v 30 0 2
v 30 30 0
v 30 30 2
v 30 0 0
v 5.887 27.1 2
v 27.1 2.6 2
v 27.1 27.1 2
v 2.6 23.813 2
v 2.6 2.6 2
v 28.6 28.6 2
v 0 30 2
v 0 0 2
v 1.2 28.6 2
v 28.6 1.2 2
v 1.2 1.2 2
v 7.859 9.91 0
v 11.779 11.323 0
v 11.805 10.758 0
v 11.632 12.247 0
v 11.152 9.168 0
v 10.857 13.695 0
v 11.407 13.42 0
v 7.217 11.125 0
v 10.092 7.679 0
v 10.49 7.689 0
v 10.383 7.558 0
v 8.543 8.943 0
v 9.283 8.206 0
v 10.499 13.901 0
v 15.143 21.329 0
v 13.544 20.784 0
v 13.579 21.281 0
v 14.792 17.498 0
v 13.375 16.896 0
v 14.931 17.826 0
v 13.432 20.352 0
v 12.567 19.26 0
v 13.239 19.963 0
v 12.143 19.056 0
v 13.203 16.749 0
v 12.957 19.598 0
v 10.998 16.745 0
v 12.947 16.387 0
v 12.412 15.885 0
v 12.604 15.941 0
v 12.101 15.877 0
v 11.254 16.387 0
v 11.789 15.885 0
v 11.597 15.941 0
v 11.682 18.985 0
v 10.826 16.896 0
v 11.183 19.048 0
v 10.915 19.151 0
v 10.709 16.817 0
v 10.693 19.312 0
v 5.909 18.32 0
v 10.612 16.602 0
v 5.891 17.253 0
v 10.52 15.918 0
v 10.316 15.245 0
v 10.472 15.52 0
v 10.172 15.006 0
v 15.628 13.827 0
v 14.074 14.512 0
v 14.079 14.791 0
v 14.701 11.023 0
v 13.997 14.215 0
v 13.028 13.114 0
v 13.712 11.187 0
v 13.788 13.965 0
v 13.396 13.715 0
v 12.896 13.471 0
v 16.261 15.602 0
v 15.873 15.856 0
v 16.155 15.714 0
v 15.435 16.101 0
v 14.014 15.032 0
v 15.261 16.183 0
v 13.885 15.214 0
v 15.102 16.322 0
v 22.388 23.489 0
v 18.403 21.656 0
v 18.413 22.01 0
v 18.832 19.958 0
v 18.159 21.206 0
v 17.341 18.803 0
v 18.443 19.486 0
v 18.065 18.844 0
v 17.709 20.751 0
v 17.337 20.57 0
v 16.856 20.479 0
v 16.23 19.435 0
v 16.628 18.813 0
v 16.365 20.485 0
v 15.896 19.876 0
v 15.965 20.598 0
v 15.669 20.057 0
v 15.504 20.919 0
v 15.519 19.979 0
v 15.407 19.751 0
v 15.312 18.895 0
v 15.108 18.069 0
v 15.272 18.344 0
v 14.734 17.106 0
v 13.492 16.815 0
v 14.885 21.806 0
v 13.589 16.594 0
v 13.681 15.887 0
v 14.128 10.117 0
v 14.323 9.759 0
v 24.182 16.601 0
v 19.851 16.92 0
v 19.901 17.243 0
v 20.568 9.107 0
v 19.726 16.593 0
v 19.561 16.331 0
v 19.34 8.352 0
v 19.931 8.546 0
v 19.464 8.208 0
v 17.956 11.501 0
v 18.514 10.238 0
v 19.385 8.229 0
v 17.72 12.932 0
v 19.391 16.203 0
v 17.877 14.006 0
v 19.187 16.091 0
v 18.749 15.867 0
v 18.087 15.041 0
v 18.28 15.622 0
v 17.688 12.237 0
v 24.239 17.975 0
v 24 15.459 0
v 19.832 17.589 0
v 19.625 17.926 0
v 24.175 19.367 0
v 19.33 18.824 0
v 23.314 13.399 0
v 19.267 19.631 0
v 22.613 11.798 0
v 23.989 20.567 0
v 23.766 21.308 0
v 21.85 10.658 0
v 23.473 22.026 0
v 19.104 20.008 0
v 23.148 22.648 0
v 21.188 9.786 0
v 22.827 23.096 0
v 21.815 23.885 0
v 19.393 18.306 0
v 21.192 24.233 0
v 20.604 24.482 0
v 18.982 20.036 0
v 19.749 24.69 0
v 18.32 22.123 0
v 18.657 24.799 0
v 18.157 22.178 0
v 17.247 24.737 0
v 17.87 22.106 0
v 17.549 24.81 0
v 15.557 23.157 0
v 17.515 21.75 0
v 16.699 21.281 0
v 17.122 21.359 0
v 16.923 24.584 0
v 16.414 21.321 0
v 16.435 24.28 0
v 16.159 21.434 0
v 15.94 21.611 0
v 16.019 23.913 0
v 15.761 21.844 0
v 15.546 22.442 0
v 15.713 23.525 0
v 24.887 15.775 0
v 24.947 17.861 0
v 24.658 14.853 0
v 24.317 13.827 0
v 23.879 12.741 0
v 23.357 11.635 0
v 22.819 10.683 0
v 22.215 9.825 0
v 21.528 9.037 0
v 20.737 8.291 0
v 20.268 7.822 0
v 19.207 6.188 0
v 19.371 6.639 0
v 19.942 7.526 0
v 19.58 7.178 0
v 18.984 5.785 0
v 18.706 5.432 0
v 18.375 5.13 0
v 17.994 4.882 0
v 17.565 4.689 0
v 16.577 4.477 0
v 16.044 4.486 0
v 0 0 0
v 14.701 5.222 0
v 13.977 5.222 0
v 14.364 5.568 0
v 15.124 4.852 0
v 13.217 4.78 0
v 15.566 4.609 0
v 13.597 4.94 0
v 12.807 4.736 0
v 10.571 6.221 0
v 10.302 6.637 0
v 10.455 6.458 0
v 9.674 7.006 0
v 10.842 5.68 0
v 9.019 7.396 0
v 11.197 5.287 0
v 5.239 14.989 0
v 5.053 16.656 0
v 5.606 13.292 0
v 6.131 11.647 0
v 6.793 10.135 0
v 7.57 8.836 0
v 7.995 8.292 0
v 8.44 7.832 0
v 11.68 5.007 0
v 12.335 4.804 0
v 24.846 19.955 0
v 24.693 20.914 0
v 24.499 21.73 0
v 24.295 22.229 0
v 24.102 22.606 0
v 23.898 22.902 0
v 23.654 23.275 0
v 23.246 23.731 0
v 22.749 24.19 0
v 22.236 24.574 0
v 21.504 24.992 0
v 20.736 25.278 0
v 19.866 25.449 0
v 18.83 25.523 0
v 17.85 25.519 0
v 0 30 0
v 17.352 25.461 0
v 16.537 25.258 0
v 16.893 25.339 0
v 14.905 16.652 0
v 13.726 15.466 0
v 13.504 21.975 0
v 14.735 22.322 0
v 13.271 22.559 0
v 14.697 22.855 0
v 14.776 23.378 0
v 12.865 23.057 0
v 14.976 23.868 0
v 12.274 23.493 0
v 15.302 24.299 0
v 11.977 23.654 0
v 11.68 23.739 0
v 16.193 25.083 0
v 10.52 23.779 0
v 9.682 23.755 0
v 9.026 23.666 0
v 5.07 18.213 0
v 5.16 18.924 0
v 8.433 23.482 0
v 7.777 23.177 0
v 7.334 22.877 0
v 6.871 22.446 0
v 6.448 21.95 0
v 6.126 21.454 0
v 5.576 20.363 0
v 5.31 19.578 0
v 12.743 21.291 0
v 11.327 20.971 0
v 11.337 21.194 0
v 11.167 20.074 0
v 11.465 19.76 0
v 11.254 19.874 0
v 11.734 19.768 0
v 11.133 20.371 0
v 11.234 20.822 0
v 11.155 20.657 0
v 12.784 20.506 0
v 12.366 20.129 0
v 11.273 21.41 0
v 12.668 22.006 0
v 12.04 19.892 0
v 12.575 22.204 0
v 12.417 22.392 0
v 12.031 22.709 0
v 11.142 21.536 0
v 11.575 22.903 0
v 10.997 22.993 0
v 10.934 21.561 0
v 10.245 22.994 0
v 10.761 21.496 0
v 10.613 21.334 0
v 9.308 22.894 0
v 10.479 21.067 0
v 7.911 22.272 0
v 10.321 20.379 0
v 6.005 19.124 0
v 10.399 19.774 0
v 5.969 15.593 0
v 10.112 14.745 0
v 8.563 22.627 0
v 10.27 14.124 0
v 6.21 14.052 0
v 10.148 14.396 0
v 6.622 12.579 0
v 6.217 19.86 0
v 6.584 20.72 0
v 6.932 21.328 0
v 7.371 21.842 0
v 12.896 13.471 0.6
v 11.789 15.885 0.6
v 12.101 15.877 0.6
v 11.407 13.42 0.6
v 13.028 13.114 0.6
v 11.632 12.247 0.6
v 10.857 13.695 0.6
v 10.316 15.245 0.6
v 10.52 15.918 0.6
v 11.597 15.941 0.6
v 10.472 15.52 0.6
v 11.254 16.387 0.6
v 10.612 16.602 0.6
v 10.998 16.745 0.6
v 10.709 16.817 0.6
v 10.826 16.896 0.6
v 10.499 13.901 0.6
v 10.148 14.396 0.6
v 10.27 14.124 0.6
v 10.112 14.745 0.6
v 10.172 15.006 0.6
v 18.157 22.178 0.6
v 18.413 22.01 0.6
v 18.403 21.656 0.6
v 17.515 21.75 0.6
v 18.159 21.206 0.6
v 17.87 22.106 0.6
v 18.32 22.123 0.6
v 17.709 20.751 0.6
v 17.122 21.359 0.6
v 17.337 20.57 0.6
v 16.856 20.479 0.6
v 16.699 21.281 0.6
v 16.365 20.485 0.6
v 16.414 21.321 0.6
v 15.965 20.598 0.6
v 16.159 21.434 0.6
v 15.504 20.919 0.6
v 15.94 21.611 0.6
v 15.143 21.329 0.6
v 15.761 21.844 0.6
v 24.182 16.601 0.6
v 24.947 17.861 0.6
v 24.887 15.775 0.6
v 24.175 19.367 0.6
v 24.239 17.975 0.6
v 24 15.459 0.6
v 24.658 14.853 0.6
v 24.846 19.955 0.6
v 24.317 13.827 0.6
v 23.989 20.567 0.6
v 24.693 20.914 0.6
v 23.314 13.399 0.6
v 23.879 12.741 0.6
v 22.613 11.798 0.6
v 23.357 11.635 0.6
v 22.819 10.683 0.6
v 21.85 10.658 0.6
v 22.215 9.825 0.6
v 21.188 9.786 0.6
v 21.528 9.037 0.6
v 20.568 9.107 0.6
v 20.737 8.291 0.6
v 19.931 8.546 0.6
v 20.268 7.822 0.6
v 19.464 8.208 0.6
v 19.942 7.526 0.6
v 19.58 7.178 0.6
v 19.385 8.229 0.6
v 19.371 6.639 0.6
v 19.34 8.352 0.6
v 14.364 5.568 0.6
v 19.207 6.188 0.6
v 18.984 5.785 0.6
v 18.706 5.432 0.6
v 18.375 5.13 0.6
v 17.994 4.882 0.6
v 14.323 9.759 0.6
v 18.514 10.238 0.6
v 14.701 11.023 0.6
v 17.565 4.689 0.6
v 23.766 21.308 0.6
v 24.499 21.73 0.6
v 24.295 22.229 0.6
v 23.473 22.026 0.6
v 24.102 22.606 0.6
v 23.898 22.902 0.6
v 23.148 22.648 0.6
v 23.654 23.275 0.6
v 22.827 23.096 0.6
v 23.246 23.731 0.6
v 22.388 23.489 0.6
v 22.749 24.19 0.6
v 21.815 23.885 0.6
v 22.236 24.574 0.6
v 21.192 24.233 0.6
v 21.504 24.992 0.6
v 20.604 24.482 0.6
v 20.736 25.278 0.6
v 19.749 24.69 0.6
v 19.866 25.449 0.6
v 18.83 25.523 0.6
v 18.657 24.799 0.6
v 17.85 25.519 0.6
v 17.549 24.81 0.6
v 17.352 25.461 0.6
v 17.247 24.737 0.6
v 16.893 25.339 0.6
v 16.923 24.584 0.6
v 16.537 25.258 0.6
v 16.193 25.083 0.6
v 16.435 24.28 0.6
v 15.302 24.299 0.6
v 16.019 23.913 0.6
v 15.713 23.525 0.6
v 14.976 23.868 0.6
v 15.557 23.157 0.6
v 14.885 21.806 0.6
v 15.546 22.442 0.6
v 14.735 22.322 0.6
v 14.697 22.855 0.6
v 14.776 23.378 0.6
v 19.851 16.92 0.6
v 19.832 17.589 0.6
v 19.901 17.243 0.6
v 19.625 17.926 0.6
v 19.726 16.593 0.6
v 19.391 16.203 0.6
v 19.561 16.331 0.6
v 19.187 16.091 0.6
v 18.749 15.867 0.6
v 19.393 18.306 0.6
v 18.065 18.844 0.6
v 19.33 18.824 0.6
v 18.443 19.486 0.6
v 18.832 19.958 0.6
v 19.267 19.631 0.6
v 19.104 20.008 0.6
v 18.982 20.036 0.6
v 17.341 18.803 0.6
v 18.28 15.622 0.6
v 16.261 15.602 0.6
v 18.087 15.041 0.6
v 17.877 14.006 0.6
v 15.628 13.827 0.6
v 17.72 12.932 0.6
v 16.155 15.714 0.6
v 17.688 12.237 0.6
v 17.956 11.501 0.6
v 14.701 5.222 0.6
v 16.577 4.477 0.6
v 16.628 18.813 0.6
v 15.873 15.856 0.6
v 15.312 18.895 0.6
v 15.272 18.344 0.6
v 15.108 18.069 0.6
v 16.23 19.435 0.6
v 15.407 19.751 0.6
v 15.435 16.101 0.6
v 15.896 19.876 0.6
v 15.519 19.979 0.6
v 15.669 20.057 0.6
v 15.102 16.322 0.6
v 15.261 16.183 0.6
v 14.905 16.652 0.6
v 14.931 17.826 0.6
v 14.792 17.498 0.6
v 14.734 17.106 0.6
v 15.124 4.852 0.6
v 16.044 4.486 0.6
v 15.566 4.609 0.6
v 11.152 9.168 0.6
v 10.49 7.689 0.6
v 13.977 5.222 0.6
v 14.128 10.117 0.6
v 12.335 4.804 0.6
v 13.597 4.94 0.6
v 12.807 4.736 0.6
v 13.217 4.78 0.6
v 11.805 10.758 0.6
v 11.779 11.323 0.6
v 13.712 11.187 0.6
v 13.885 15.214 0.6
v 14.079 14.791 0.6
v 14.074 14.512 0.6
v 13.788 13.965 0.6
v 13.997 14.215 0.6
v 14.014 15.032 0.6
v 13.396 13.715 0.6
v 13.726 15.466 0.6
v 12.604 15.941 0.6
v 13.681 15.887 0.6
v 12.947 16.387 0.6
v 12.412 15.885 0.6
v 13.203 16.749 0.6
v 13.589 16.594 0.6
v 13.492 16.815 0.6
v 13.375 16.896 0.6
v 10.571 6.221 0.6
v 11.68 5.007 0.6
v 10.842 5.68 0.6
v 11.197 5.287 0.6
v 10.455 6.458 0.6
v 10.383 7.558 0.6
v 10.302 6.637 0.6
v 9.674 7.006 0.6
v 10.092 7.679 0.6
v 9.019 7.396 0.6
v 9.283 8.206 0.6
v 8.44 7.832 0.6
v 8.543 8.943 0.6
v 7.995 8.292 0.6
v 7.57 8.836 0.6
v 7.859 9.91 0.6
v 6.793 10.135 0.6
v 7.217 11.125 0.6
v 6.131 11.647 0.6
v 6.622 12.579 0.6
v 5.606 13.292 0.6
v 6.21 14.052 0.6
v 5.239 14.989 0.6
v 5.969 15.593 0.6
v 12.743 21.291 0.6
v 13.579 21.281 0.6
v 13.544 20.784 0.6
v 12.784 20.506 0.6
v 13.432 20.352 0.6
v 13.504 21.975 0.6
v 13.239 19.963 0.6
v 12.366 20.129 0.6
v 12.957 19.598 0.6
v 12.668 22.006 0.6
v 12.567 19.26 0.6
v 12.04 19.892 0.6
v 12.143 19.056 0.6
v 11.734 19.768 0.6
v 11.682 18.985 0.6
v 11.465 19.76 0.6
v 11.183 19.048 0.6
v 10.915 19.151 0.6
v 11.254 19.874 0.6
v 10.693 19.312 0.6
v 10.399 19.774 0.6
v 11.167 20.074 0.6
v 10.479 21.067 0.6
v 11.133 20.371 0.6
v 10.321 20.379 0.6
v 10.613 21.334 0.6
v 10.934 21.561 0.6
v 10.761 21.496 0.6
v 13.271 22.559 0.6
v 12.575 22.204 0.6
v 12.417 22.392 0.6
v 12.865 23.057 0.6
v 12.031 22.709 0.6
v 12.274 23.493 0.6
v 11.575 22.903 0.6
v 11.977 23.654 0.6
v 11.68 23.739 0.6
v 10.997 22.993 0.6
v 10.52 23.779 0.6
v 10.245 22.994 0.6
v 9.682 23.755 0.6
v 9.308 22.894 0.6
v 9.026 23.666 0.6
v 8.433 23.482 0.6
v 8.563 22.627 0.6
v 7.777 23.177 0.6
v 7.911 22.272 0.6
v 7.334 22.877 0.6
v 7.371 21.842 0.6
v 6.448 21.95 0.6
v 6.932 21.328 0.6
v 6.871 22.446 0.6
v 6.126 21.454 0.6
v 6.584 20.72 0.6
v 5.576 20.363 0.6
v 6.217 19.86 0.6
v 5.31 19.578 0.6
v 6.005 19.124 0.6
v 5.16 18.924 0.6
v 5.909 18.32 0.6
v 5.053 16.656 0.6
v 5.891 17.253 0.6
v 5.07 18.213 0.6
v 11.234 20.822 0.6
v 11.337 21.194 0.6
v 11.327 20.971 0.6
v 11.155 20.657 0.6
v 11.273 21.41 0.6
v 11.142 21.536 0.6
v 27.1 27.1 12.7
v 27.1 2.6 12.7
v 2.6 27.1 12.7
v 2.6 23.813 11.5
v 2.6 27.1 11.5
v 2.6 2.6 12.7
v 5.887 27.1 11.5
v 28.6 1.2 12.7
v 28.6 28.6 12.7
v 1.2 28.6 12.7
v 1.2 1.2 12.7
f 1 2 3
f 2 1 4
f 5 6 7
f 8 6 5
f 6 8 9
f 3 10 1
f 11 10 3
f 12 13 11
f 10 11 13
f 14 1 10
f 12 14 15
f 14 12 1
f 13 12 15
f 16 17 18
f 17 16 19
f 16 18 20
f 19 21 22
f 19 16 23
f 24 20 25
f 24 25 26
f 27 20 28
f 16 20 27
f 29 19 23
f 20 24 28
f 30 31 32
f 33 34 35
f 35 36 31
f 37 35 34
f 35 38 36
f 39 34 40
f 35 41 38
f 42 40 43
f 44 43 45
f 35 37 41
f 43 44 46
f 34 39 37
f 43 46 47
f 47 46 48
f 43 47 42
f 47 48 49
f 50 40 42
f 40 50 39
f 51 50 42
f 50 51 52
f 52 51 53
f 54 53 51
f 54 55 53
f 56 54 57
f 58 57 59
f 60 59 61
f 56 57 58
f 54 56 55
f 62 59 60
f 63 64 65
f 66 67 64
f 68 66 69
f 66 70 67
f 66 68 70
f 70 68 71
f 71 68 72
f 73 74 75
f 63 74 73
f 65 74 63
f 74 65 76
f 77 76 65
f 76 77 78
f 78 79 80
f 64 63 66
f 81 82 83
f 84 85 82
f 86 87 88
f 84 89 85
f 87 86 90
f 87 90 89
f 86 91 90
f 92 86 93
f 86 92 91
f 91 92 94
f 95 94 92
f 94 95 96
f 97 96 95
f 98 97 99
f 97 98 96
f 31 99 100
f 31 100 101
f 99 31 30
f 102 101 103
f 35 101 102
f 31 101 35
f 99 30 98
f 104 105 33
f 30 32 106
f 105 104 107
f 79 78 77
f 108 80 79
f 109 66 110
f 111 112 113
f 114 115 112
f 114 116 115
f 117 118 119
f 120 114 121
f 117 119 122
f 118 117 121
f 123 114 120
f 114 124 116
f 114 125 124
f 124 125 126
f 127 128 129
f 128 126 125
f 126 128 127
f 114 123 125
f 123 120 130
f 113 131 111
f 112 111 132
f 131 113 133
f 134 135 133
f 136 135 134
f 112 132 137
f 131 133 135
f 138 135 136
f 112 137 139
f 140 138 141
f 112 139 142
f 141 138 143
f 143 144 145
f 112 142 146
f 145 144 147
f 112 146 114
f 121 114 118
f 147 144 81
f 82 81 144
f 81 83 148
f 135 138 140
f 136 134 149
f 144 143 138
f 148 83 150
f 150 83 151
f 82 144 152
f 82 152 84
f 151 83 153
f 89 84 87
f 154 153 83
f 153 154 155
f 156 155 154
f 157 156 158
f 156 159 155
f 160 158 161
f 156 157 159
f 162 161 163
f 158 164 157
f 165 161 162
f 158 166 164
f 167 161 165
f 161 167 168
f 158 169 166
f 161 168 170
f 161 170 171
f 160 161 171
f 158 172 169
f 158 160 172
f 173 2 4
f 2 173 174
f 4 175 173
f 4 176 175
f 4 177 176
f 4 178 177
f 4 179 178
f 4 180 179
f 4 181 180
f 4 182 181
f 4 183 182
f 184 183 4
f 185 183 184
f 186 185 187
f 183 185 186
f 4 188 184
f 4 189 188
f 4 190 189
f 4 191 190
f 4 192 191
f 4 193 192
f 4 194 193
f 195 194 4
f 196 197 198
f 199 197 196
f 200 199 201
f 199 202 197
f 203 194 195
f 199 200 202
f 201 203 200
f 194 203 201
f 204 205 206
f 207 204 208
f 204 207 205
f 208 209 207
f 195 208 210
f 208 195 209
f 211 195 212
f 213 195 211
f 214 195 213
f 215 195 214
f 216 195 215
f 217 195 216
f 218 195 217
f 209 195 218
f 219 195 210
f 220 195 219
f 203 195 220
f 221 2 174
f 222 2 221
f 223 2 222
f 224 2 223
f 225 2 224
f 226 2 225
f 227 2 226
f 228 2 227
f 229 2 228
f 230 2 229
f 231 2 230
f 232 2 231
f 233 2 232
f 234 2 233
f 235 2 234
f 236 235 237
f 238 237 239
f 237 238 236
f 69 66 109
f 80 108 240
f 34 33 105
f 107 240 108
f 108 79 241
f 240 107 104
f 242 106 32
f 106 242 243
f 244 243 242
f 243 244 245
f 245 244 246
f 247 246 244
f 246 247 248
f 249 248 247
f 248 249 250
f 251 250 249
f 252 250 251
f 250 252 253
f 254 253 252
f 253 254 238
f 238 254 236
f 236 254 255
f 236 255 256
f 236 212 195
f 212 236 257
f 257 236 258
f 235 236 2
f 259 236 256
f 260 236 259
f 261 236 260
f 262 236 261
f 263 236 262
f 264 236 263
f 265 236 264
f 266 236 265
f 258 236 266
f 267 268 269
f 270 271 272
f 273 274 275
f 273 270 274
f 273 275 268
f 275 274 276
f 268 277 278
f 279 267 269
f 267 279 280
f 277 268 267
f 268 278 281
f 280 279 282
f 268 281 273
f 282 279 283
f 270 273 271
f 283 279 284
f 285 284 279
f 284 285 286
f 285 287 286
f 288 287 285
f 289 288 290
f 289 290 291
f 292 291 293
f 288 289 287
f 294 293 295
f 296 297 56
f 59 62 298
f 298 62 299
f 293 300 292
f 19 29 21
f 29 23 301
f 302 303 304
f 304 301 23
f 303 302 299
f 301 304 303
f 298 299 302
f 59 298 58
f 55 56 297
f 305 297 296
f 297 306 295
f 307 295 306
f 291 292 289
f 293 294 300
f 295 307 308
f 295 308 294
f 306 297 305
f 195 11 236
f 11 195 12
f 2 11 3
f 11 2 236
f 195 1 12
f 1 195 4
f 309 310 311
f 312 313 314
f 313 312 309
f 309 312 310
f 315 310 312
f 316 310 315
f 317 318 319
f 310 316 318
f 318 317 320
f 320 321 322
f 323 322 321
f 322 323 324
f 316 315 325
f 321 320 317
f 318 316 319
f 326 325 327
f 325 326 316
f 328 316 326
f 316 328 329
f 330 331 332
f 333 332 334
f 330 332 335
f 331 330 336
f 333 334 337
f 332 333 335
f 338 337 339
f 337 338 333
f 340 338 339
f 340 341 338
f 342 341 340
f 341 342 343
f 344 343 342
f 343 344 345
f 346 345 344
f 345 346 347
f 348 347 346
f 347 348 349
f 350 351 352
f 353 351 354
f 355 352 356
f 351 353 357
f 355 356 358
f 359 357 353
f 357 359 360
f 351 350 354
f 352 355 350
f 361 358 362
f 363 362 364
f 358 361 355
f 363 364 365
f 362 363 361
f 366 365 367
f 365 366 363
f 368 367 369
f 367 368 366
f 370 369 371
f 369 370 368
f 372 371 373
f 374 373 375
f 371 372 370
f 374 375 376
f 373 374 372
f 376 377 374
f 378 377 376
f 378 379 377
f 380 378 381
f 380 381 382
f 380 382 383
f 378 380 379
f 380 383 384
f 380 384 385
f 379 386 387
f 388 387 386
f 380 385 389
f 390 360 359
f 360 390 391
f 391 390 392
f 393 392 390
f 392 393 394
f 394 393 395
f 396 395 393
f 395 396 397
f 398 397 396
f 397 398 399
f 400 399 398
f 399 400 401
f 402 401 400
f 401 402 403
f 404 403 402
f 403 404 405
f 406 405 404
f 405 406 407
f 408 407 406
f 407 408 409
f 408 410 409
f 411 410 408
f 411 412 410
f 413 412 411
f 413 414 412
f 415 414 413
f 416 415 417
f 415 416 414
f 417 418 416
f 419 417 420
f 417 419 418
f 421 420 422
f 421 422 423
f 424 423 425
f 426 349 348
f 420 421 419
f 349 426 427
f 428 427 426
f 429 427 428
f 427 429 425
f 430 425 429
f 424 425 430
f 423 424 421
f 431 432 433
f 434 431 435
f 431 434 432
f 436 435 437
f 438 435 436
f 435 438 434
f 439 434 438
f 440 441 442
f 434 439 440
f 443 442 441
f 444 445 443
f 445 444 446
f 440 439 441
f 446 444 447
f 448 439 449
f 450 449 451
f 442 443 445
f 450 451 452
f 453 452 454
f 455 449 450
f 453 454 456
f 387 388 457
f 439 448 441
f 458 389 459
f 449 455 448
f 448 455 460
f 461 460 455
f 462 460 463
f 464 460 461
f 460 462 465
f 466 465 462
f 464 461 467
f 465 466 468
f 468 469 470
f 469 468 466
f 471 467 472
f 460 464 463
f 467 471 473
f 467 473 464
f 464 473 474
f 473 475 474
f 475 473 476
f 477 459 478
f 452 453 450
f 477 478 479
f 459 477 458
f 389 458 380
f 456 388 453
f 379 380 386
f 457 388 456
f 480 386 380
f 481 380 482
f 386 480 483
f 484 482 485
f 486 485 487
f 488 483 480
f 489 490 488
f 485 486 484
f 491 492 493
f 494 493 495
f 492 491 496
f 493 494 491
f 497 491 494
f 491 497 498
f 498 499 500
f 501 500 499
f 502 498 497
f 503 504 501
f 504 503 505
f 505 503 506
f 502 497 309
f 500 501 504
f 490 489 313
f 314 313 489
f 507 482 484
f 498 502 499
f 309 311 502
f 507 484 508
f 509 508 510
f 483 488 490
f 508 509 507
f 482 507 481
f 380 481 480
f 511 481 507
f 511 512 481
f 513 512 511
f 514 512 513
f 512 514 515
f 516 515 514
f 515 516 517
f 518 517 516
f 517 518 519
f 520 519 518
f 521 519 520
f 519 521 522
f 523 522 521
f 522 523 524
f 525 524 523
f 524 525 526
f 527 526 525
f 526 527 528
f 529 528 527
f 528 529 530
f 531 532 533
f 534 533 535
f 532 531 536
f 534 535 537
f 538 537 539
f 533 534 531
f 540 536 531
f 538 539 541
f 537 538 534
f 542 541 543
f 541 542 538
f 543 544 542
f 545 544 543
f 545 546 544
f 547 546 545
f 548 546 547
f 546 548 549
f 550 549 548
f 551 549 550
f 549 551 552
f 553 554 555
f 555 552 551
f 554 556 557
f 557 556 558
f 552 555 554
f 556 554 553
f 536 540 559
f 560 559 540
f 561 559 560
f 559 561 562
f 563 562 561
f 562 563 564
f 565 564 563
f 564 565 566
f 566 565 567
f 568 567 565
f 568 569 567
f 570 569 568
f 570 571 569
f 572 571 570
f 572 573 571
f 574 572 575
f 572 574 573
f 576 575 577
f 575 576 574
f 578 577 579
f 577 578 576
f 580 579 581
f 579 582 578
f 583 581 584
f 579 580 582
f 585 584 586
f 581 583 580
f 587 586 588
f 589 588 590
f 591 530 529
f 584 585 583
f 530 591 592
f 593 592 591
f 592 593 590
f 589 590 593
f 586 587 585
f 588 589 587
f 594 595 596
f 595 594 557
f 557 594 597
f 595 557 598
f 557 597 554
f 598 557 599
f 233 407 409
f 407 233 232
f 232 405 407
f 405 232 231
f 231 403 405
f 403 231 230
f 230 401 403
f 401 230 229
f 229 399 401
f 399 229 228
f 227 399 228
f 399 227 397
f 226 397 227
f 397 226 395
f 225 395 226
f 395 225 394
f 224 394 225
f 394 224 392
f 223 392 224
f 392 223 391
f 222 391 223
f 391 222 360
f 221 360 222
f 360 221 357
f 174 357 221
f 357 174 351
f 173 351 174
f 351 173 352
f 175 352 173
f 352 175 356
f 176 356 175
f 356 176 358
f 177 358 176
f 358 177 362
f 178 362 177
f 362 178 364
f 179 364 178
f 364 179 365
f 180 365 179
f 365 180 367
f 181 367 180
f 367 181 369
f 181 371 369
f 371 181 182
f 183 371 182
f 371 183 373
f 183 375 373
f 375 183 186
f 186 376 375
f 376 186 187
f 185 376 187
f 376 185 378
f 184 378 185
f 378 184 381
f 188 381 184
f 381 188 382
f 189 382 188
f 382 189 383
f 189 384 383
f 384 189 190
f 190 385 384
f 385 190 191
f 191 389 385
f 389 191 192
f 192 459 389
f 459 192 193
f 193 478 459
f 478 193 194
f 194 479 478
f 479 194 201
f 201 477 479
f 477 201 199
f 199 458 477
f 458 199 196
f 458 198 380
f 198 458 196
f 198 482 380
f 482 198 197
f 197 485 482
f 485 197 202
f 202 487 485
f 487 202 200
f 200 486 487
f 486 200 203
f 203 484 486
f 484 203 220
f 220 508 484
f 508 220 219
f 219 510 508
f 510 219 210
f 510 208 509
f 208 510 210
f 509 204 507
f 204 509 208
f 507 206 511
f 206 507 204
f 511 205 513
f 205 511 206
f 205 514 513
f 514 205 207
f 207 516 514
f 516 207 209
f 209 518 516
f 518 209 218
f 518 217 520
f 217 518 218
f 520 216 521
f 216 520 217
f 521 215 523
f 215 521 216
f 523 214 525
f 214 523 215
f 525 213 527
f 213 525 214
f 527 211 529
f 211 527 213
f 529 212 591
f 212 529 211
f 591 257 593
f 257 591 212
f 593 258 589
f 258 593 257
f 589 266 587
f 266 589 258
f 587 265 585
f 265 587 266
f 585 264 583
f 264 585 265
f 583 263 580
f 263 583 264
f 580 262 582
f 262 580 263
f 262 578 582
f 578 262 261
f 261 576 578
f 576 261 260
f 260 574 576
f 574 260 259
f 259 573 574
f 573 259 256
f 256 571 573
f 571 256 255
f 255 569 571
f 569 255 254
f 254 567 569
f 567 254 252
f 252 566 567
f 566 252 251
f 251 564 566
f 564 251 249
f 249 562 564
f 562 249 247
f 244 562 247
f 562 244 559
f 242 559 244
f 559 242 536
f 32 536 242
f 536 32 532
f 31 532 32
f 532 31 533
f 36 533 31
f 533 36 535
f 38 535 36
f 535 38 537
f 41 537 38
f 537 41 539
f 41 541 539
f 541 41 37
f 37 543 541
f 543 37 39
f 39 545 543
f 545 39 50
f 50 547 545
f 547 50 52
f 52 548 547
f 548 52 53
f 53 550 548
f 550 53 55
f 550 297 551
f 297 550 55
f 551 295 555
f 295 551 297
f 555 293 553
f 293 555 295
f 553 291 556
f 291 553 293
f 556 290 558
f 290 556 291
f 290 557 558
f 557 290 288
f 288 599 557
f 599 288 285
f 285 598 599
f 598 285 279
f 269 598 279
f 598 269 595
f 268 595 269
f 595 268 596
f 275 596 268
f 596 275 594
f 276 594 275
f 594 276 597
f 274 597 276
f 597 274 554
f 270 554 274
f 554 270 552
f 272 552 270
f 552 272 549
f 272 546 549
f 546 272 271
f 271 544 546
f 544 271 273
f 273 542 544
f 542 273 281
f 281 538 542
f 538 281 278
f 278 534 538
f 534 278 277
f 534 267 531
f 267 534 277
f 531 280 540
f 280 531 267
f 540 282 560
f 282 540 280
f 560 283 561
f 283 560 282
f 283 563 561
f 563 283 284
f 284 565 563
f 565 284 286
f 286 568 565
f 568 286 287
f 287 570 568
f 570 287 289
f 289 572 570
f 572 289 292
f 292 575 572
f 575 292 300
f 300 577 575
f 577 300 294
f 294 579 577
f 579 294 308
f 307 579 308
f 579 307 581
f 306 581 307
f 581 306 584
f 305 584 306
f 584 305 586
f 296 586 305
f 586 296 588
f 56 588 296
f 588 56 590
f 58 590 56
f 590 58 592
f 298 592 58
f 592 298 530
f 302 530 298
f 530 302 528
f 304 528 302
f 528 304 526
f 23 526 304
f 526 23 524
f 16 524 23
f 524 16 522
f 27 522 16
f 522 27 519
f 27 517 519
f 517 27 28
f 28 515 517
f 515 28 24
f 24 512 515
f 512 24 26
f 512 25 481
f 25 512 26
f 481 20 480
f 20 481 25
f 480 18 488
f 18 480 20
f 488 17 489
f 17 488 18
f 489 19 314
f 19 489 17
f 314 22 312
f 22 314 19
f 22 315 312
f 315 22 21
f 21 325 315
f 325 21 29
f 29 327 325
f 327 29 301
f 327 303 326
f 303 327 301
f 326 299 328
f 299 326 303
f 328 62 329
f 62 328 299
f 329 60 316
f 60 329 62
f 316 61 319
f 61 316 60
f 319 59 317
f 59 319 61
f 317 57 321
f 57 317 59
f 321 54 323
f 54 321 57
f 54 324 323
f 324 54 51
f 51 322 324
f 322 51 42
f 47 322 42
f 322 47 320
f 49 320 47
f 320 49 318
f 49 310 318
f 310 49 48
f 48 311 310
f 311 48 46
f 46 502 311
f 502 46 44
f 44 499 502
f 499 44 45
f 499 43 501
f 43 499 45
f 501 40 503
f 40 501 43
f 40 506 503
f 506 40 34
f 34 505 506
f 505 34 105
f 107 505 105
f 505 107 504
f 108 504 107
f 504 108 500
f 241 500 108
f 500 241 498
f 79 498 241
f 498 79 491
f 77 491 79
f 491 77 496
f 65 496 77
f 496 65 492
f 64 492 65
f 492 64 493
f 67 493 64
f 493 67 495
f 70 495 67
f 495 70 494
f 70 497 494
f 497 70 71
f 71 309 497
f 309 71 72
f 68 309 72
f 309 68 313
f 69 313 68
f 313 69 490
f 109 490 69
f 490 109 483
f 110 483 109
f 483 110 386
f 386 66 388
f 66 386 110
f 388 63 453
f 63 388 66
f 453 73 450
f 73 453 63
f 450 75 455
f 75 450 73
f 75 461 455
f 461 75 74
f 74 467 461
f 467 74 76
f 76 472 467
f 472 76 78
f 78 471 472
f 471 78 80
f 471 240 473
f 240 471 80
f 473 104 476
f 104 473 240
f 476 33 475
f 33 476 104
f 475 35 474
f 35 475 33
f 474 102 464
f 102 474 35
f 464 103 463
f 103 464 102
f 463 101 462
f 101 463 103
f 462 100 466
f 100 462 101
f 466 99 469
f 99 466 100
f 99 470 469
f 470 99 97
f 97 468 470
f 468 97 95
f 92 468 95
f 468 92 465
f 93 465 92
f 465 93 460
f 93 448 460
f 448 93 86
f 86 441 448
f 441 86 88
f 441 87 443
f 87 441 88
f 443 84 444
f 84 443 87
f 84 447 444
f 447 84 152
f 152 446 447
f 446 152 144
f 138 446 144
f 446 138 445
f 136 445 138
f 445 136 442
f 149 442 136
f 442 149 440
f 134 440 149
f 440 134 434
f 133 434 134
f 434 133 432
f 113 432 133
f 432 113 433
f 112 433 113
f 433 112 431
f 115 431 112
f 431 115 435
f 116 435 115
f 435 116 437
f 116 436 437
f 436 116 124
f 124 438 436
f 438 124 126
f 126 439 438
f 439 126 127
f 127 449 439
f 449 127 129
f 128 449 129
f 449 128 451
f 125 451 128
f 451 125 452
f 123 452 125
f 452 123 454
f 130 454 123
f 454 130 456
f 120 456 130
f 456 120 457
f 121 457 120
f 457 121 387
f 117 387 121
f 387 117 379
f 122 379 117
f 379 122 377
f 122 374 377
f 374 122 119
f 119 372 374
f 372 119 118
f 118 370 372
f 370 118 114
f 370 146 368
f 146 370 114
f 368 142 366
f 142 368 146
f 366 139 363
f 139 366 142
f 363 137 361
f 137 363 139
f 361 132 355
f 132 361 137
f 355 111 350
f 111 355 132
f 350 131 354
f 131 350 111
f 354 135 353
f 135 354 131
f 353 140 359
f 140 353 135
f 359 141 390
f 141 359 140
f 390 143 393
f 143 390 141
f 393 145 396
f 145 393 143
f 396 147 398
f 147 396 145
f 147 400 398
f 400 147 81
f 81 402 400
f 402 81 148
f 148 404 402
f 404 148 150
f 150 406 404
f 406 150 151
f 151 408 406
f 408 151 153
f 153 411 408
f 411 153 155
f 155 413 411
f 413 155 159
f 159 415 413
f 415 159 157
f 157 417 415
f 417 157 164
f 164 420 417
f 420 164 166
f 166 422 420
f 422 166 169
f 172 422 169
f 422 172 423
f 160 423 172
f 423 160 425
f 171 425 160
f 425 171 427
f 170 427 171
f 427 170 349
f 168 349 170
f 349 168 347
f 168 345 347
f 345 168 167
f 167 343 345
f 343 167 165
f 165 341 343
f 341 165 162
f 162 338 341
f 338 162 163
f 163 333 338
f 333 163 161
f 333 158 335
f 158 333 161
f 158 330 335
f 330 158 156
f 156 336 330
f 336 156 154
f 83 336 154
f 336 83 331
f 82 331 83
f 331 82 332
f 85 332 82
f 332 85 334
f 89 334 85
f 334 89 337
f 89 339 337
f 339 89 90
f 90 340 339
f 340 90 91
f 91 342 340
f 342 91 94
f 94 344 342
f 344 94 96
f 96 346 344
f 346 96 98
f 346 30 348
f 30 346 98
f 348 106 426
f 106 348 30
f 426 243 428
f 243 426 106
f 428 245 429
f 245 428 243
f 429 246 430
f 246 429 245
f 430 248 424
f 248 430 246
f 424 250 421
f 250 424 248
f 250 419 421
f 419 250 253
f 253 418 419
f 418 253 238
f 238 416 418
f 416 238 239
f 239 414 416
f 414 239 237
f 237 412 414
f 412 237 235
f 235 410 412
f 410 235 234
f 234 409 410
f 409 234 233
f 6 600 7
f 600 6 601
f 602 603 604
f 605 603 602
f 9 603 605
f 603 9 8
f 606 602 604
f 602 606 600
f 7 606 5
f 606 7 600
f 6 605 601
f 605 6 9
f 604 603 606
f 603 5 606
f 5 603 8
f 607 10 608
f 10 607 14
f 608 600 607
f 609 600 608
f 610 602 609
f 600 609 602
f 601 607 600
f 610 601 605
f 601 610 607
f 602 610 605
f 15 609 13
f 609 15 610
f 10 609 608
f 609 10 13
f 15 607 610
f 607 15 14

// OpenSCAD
// file: gato4.scad
// Module names are of the form poly_<inkscape-path-id>().  As a result,
// you can associate a polygon in this OpenSCAD program with the corresponding
// SVG element in the Inkscape document by looking for the XML element with
// the attribute id="inkscape-path-id".

// fudge value is used to ensure that subtracted solids are a tad taller
// in the z dimension than the polygon being subtracted from.  This helps
// keep the resulting .stl file manifold.
fudge = 0.1;

module poly_path8(h)
{
  scale([25.4/90, -25.4/90, 1]) union()
  {
    linear_extrude(height=h)
      polygon([[10.415846,-46.334673],[8.383623,-45.792747],[6.806534,-45.434991],[5.284484,-44.658089],[1.338585,-41.186376],[-0.104169,-39.276140],[-0.990708,-37.107113],[-1.340614,-34.788844],[-1.173467,-32.430884],[-0.508849,-30.142781],[0.633658,-28.034086],[2.234475,-26.214347],[4.274018,-24.793115],[6.045862,-24.295643],[8.219917,-24.268124],[10.351633,-24.672451],[11.996463,-25.470522],[13.989876,-27.487221],[15.073023,-29.478516],[15.114655,-31.046432],[14.703888,-31.547255],[13.983525,-31.792992],[12.713386,-31.471223],[11.138414,-29.896251],[9.399735,-28.163217],[7.525574,-27.818868],[6.263550,-27.994394],[5.134890,-28.494864],[4.162881,-29.281116],[3.370808,-30.313986],[2.419615,-32.962931],[2.467598,-36.128400],[3.159118,-37.757706],[4.511111,-39.475922],[6.354223,-41.100994],[8.519105,-42.450870],[9.953656,-43.126161],[11.290831,-43.450046],[16.196390,-43.399241],[21.034209,-42.919410],[24.822045,-41.999265],[27.427242,-40.893538],[30.184855,-39.351731],[32.722310,-37.598233],[34.667034,-35.857437],[36.087473,-33.872492],[37.529081,-31.121230],[38.826740,-27.938120],[39.815331,-24.657633],[40.635277,-19.344218],[40.921764,-13.175576],[40.666325,-7.091610],[39.860492,-2.032223],[36.823448,7.090198],[33.718664,14.180397],[30.338683,19.232022],[27.407484,23.093951],[24.662572,26.100652],[21.841452,28.586596],[19.769715,30.082538],[19.421838,29.990100],[19.222143,29.444646],[15.564143,21.089953],[13.091606,15.495697],[11.906142,12.238495],[12.048680,9.159114],[12.741612,4.403149],[13.671636,-0.183465],[14.525451,-2.754790],[16.602834,-3.838642],[18.544736,-4.832174],[19.447946,-5.328939],[20.200856,-5.896268],[20.932597,-7.056328],[21.486519,-8.504287],[21.705971,-9.935310],[21.401138,-11.465122],[20.486637,-12.961064],[19.459236,-14.643292],[19.176983,-16.935187],[18.899669,-20.512040],[18.177807,-22.179451],[17.638262,-22.303730],[16.973292,-21.958587],[15.248019,-19.870620],[13.577081,-17.025509],[10.370685,-16.844866],[7.209450,-16.890027],[5.448191,-19.644818],[3.969185,-21.598009],[2.964363,-22.399608],[2.298246,-22.052437],[1.801481,-21.044793],[1.383746,-17.251311],[1.203104,-14.812644],[0.480536,-13.593311],[-0.304128,-12.515104],[-0.919440,-11.064323],[-1.179112,-9.325643],[-0.422674,-7.316001],[0.452311,-5.853930],[1.157943,-5.238618],[1.925672,-4.877334],[3.867573,-3.793482],[5.115132,-3.161235],[5.583672,-2.664470],[2.783721,5.193458],[-1.325884,17.612595],[-2.996823,23.212497],[-3.860517,21.626234],[-5.706453,16.890027],[-8.732206,8.354692],[-9.319293,6.774075],[-7.106428,5.690223],[-5.367749,4.583791],[-4.441959,3.477359],[-4.100432,2.163470],[-4.080675,0.925790],[-4.365750,-0.142538],[-4.938724,-0.948371],[-5.644357,-2.066093],[-5.841934,-3.928964],[-6.248379,-7.061973],[-6.680226,-8.037863],[-7.196749,-8.399853],[-7.958832,-7.745026],[-9.093490,-6.141828],[-10.612012,-4.166056],[-11.462299,-3.919085],[-12.841812,-3.883803],[-14.221324,-3.919085],[-15.071611,-4.166056],[-16.590133,-6.141828],[-17.724791,-7.728091],[-18.486874,-8.399853],[-19.003397,-8.046331],[-19.435245,-7.095844],[-19.841689,-4.064445],[-20.056201,-2.303186],[-20.744899,-1.083852],[-21.382791,-0.028225],[-21.648109,1.129012],[-21.488636,2.675054],[-20.948121,3.878158],[-19.933421,4.869572],[-18.351393,5.780544],[-15.912726,6.999877],[-14.919195,12.193335],[-14.264367,16.286005],[-14.151466,18.786768],[-17.041738,25.831806],[-19.977171,32.380078],[-20.451356,32.961520],[-21.738430,32.425239],[-25.322339,30.091006],[-28.597181,26.825337],[-31.626463,22.543557],[-34.473691,17.160990],[-37.105701,10.722796],[-38.933290,4.199927],[-39.998796,-2.627777],[-40.344556,-9.980471],[-40.264820,-14.703977],[-39.842145,-18.267422],[-38.902948,-21.526035],[-37.273642,-25.335041],[-35.733246,-28.026324],[-33.790638,-30.302696],[-31.399249,-32.206493],[-28.512505,-33.780054],[-25.210143,-34.965517],[-21.061023,-35.405832],[-17.729024,-35.402304],[-15.167577,-35.005033],[-13.148056,-34.142044],[-11.441836,-32.741363],[-10.739731,-31.909421],[-10.329759,-31.030909],[-9.996700,-27.864029],[-9.816058,-24.386670],[-11.667639,-22.715732],[-13.109952,-21.669278],[-14.467590,-21.118179],[-15.655875,-21.083603],[-16.590133,-21.586719],[-16.978937,-22.471583],[-17.126414,-23.788293],[-17.028331,-25.054199],[-16.680454,-25.786646],[-16.267659,-26.445707],[-16.223204,-27.435004],[-16.508985,-28.390431],[-17.086899,-28.947880],[-18.009161,-29.061487],[-18.774772,-28.772884],[-19.430305,-28.052432],[-20.022331,-26.870497],[-20.723024,-23.822164],[-20.377970,-21.146404],[-19.076077,-19.097246],[-18.094101,-18.387027],[-16.906257,-17.928719],[-14.694098,-17.649288],[-12.655524,-17.962589],[-10.777836,-18.868621],[-9.048330,-20.367385],[-7.798654,-21.982579],[-6.942721,-23.703617],[-6.450895,-25.619411],[-6.293539,-27.818868],[-6.625186,-30.893310],[-7.659644,-33.480866],[-9.456185,-35.687379],[-12.074083,-37.618696],[-13.389383,-38.330680],[-14.704682,-38.708194],[-19.841689,-38.883190],[-23.556140,-38.778051],[-26.457702,-38.380780],[-29.088301,-37.568597],[-31.989864,-36.218721],[-33.952228,-34.886486],[-36.003503,-32.978455],[-37.876958,-30.782526],[-39.305865,-28.586596],[-41.738886,-23.754423],[-42.918705,-20.277065],[-43.580654,-17.381743],[-43.982622,-14.229615],[-44.054773,-7.334347],[-43.231476,0.049924],[-41.609050,7.564384],[-39.283814,14.850219],[-36.352086,21.548615],[-32.910185,27.300757],[-31.028020,29.709854],[-29.054431,31.747831],[-26.491573,33.678443],[-23.590011,35.405832],[-20.806995,37.042900],[-20.128882,37.831798],[-19.615887,38.883190],[-18.414194,41.280225],[-16.844161,43.021021],[-14.706799,44.262229],[-11.803120,45.160500],[-9.714447,45.461805],[-7.896737,45.267756],[-6.214508,44.557184],[-4.532280,43.308920],[-2.816181,41.773462],[-1.325884,43.308920],[0.550394,44.948105],[2.507113,46.024195],[4.624717,46.566826],[6.983648,46.605636],[11.362100,45.668556],[13.260516,44.814740],[14.948831,43.715364],[16.414872,42.378895],[17.646465,40.813802],[18.631441,39.028551],[19.357625,37.031610],[20.283415,34.643749],[21.886613,33.102646],[23.331749,31.792992],[25.409132,29.715609],[28.911893,26.410425],[31.957404,22.918954],[34.630342,19.122649],[37.015380,14.902965],[39.324917,10.005873],[41.266113,5.193458],[42.775461,0.652005],[43.789455,-3.432198],[44.054773,-12.673165],[43.608813,-21.948003],[42.931406,-26.193090],[42.073356,-29.805930],[41.170146,-32.018794],[40.312097,-33.689733],[39.408887,-34.999387],[38.328563,-36.651980],[36.524260,-38.668678],[34.321980,-40.702312],[32.047725,-42.405710],[28.808165,-44.255879],[25.403487,-45.521784],[21.550026,-46.279634],[16.964118,-46.605636],[12.623065,-46.588701],[10.415846,-46.334673]]);
  }
}

module gato4(h)
{

poly_path8(h);
}

gato4(3);
// file: pcb_holes.scad
// Module names are of the form poly_<inkscape-path-id>().  As a result,
// you can associate a polygon in this OpenSCAD program with the corresponding
// SVG element in the Inkscape document by looking for the XML element with
// the attribute id="inkscape-path-id".

// fudge value is used to ensure that subtracted solids are a tad taller
// in the z dimension than the polygon being subtracted from.  This helps
// keep the resulting .stl file manifold.
fudge = 0.1;

module poly_path14(h)
{
  scale([25.4/90, -25.4/90, 1]) union()
  {
    linear_extrude(height=h)
      polygon([[23.247500,21.596250],[22.941387,23.114434],[22.106406,24.354531],[20.867598,25.190801],[19.350000,25.497500],[17.833125,25.190801],[16.594688,24.354531],[15.759844,23.114434],[15.453750,21.596250],[15.759844,20.081484],[16.594688,18.842812],[17.833125,18.006797],[19.350000,17.700000],[20.867598,18.006797],[22.106406,18.842812],[22.941387,20.081484],[23.247500,21.596250]]);
  }
}

module poly_path16(h)
{
  scale([25.4/90, -25.4/90, 1]) union()
  {
    linear_extrude(height=h)
      polygon([[-15.448750,-21.601250],[-15.755645,-20.084375],[-16.592344,-18.845937],[-17.832871,-18.011094],[-19.351250,-17.705000],[-20.868125,-18.011094],[-22.106563,-18.845937],[-22.941406,-20.084375],[-23.247500,-21.601250],[-22.941406,-23.118652],[-22.106563,-24.357031],[-20.868125,-25.191582],[-19.351250,-25.497500],[-17.832871,-25.191582],[-16.592344,-24.357031],[-15.755645,-23.118652],[-15.448750,-21.601250]]);
  }
}

module pcb_holes(h)
{

poly_path14(h);
poly_path16(h);
}

pcb_holes(3);
// file: pcb_mascara2.scad
// Module names are of the form poly_<inkscape-path-id>().  As a result,
// you can associate a polygon in this OpenSCAD program with the corresponding
// SVG element in the Inkscape document by looking for the XML element with
// the attribute id="inkscape-path-id".

// fudge value is used to ensure that subtracted solids are a tad taller
// in the z dimension than the polygon being subtracted from.  This helps
// keep the resulting .stl file manifold.
fudge = 0.1;

module poly_rect4600(h)
{
  scale([25.4/90, -25.4/90, 1]) union()
  {
    linear_extrude(height=h)
      polygon([[-36.221907,-36.578865],[36.221907,-36.578865],[36.221907,36.578865],[-36.221907,36.578865]]);
  }
}

module pcb_mascara2(h)
{

poly_rect4600(h);
}

pcb_mascara2(7);
// file: pcb_mascara.scad
// Module names are of the form poly_<inkscape-path-id>().  As a result,
// you can associate a polygon in this OpenSCAD program with the corresponding
// SVG element in the Inkscape document by looking for the XML element with
// the attribute id="inkscape-path-id".

// fudge value is used to ensure that subtracted solids are a tad taller
// in the z dimension than the polygon being subtracted from.  This helps
// keep the resulting .stl file manifold.
fudge = 0.1;

module poly_path20(h)
{
  scale([25.4/90, -25.4/90, 1]) union()
  {
    linear_extrude(height=h)
      polygon([[-42.690625,-42.690625],[42.690625,-42.690625],[42.690625,42.690625],[-42.690625,42.690625],[-42.690625,-42.690625]]);
  }
}

module poly_path24(h)
{
  scale([25.4/90, -25.4/90, 1]) union()
  {
    linear_extrude(height=h)
      polygon([[-42.690625,-42.690625],[42.690625,-42.690625],[42.690625,42.690625],[-42.690625,42.690625],[-42.690625,-42.690625]]);
  }
}

module poly_path16(h)
{
  scale([25.4/90, -25.4/90, 1]) union()
  {
    linear_extrude(height=h)
      polygon([[-42.690625,-42.690625],[42.690625,-42.690625],[42.690625,42.690625],[-42.690625,42.690625],[-42.690625,-42.690625]]);
  }
}

module pcb_mascara(h)
{

poly_path20(h);
poly_path24(h);
poly_path16(h);
}

pcb_mascara(1);
// file: pcb_button.scad
// Module names are of the form poly_<inkscape-path-id>().  As a result,
// you can associate a polygon in this OpenSCAD program with the corresponding
// SVG element in the Inkscape document by looking for the XML element with
// the attribute id="inkscape-path-id".

// fudge value is used to ensure that subtracted solids are a tad taller
// in the z dimension than the polygon being subtracted from.  This helps
// keep the resulting .stl file manifold.
fudge = 0.1;

module poly_path14(h)
{
  scale([25.4/90, -25.4/90, 1]) union()
  {
    linear_extrude(height=h)
      polygon([[-7.812500,-7.798125],[7.812500,-7.798125],[7.812500,7.798125],[-7.812500,7.798125],[-7.812500,-7.798125]]);
  }
}

module pcb_button(h)
{

poly_path14(h);
}

pcb_button(12);
// main file
use <pcb_button.scad>
use <pcb_mascara.scad>
use <pcb_mascara2.scad>
use <pcb_holes.scad>
use <gato4.scad>

/*
 *
 * El cubo mide 30x30x25, pero va roto en dos partes
 *
 */

module llavero_abajo() {

    module base() {
            union() {
                difference() {
                    cube([30,30,2]);
                    translate([15,15,-1]) { scale([0.8,0.8,0.8]) gato4(2.0); }
                }
                // bisel interior
                difference() {
                    translate([1.2,1.2,2]) cube([27.4,27.4,10.7]);
                    difference() {
                        translate([2.6,2.6,2]) cube([24.5,24.5,90]);
                        rotate([0,0,45]) { translate([15,15,2]) cube([24,24,9.5]); }
                    }
                }
    
                translate([15,15,2]) {
                    //translate([0,0,7]) pcb_mascara(1);
                    //translate([0,0,0]) pcb_mascara2(7);
                    //translate([-12+5.20,12-4.85,8]) cylinder(12, r=2.1, $fn=200);
                    //pcb_holes(40);
                }
    
            }
   }

   translate([0,0,0]) {
      base();
   }
}

llavero_abajo();
